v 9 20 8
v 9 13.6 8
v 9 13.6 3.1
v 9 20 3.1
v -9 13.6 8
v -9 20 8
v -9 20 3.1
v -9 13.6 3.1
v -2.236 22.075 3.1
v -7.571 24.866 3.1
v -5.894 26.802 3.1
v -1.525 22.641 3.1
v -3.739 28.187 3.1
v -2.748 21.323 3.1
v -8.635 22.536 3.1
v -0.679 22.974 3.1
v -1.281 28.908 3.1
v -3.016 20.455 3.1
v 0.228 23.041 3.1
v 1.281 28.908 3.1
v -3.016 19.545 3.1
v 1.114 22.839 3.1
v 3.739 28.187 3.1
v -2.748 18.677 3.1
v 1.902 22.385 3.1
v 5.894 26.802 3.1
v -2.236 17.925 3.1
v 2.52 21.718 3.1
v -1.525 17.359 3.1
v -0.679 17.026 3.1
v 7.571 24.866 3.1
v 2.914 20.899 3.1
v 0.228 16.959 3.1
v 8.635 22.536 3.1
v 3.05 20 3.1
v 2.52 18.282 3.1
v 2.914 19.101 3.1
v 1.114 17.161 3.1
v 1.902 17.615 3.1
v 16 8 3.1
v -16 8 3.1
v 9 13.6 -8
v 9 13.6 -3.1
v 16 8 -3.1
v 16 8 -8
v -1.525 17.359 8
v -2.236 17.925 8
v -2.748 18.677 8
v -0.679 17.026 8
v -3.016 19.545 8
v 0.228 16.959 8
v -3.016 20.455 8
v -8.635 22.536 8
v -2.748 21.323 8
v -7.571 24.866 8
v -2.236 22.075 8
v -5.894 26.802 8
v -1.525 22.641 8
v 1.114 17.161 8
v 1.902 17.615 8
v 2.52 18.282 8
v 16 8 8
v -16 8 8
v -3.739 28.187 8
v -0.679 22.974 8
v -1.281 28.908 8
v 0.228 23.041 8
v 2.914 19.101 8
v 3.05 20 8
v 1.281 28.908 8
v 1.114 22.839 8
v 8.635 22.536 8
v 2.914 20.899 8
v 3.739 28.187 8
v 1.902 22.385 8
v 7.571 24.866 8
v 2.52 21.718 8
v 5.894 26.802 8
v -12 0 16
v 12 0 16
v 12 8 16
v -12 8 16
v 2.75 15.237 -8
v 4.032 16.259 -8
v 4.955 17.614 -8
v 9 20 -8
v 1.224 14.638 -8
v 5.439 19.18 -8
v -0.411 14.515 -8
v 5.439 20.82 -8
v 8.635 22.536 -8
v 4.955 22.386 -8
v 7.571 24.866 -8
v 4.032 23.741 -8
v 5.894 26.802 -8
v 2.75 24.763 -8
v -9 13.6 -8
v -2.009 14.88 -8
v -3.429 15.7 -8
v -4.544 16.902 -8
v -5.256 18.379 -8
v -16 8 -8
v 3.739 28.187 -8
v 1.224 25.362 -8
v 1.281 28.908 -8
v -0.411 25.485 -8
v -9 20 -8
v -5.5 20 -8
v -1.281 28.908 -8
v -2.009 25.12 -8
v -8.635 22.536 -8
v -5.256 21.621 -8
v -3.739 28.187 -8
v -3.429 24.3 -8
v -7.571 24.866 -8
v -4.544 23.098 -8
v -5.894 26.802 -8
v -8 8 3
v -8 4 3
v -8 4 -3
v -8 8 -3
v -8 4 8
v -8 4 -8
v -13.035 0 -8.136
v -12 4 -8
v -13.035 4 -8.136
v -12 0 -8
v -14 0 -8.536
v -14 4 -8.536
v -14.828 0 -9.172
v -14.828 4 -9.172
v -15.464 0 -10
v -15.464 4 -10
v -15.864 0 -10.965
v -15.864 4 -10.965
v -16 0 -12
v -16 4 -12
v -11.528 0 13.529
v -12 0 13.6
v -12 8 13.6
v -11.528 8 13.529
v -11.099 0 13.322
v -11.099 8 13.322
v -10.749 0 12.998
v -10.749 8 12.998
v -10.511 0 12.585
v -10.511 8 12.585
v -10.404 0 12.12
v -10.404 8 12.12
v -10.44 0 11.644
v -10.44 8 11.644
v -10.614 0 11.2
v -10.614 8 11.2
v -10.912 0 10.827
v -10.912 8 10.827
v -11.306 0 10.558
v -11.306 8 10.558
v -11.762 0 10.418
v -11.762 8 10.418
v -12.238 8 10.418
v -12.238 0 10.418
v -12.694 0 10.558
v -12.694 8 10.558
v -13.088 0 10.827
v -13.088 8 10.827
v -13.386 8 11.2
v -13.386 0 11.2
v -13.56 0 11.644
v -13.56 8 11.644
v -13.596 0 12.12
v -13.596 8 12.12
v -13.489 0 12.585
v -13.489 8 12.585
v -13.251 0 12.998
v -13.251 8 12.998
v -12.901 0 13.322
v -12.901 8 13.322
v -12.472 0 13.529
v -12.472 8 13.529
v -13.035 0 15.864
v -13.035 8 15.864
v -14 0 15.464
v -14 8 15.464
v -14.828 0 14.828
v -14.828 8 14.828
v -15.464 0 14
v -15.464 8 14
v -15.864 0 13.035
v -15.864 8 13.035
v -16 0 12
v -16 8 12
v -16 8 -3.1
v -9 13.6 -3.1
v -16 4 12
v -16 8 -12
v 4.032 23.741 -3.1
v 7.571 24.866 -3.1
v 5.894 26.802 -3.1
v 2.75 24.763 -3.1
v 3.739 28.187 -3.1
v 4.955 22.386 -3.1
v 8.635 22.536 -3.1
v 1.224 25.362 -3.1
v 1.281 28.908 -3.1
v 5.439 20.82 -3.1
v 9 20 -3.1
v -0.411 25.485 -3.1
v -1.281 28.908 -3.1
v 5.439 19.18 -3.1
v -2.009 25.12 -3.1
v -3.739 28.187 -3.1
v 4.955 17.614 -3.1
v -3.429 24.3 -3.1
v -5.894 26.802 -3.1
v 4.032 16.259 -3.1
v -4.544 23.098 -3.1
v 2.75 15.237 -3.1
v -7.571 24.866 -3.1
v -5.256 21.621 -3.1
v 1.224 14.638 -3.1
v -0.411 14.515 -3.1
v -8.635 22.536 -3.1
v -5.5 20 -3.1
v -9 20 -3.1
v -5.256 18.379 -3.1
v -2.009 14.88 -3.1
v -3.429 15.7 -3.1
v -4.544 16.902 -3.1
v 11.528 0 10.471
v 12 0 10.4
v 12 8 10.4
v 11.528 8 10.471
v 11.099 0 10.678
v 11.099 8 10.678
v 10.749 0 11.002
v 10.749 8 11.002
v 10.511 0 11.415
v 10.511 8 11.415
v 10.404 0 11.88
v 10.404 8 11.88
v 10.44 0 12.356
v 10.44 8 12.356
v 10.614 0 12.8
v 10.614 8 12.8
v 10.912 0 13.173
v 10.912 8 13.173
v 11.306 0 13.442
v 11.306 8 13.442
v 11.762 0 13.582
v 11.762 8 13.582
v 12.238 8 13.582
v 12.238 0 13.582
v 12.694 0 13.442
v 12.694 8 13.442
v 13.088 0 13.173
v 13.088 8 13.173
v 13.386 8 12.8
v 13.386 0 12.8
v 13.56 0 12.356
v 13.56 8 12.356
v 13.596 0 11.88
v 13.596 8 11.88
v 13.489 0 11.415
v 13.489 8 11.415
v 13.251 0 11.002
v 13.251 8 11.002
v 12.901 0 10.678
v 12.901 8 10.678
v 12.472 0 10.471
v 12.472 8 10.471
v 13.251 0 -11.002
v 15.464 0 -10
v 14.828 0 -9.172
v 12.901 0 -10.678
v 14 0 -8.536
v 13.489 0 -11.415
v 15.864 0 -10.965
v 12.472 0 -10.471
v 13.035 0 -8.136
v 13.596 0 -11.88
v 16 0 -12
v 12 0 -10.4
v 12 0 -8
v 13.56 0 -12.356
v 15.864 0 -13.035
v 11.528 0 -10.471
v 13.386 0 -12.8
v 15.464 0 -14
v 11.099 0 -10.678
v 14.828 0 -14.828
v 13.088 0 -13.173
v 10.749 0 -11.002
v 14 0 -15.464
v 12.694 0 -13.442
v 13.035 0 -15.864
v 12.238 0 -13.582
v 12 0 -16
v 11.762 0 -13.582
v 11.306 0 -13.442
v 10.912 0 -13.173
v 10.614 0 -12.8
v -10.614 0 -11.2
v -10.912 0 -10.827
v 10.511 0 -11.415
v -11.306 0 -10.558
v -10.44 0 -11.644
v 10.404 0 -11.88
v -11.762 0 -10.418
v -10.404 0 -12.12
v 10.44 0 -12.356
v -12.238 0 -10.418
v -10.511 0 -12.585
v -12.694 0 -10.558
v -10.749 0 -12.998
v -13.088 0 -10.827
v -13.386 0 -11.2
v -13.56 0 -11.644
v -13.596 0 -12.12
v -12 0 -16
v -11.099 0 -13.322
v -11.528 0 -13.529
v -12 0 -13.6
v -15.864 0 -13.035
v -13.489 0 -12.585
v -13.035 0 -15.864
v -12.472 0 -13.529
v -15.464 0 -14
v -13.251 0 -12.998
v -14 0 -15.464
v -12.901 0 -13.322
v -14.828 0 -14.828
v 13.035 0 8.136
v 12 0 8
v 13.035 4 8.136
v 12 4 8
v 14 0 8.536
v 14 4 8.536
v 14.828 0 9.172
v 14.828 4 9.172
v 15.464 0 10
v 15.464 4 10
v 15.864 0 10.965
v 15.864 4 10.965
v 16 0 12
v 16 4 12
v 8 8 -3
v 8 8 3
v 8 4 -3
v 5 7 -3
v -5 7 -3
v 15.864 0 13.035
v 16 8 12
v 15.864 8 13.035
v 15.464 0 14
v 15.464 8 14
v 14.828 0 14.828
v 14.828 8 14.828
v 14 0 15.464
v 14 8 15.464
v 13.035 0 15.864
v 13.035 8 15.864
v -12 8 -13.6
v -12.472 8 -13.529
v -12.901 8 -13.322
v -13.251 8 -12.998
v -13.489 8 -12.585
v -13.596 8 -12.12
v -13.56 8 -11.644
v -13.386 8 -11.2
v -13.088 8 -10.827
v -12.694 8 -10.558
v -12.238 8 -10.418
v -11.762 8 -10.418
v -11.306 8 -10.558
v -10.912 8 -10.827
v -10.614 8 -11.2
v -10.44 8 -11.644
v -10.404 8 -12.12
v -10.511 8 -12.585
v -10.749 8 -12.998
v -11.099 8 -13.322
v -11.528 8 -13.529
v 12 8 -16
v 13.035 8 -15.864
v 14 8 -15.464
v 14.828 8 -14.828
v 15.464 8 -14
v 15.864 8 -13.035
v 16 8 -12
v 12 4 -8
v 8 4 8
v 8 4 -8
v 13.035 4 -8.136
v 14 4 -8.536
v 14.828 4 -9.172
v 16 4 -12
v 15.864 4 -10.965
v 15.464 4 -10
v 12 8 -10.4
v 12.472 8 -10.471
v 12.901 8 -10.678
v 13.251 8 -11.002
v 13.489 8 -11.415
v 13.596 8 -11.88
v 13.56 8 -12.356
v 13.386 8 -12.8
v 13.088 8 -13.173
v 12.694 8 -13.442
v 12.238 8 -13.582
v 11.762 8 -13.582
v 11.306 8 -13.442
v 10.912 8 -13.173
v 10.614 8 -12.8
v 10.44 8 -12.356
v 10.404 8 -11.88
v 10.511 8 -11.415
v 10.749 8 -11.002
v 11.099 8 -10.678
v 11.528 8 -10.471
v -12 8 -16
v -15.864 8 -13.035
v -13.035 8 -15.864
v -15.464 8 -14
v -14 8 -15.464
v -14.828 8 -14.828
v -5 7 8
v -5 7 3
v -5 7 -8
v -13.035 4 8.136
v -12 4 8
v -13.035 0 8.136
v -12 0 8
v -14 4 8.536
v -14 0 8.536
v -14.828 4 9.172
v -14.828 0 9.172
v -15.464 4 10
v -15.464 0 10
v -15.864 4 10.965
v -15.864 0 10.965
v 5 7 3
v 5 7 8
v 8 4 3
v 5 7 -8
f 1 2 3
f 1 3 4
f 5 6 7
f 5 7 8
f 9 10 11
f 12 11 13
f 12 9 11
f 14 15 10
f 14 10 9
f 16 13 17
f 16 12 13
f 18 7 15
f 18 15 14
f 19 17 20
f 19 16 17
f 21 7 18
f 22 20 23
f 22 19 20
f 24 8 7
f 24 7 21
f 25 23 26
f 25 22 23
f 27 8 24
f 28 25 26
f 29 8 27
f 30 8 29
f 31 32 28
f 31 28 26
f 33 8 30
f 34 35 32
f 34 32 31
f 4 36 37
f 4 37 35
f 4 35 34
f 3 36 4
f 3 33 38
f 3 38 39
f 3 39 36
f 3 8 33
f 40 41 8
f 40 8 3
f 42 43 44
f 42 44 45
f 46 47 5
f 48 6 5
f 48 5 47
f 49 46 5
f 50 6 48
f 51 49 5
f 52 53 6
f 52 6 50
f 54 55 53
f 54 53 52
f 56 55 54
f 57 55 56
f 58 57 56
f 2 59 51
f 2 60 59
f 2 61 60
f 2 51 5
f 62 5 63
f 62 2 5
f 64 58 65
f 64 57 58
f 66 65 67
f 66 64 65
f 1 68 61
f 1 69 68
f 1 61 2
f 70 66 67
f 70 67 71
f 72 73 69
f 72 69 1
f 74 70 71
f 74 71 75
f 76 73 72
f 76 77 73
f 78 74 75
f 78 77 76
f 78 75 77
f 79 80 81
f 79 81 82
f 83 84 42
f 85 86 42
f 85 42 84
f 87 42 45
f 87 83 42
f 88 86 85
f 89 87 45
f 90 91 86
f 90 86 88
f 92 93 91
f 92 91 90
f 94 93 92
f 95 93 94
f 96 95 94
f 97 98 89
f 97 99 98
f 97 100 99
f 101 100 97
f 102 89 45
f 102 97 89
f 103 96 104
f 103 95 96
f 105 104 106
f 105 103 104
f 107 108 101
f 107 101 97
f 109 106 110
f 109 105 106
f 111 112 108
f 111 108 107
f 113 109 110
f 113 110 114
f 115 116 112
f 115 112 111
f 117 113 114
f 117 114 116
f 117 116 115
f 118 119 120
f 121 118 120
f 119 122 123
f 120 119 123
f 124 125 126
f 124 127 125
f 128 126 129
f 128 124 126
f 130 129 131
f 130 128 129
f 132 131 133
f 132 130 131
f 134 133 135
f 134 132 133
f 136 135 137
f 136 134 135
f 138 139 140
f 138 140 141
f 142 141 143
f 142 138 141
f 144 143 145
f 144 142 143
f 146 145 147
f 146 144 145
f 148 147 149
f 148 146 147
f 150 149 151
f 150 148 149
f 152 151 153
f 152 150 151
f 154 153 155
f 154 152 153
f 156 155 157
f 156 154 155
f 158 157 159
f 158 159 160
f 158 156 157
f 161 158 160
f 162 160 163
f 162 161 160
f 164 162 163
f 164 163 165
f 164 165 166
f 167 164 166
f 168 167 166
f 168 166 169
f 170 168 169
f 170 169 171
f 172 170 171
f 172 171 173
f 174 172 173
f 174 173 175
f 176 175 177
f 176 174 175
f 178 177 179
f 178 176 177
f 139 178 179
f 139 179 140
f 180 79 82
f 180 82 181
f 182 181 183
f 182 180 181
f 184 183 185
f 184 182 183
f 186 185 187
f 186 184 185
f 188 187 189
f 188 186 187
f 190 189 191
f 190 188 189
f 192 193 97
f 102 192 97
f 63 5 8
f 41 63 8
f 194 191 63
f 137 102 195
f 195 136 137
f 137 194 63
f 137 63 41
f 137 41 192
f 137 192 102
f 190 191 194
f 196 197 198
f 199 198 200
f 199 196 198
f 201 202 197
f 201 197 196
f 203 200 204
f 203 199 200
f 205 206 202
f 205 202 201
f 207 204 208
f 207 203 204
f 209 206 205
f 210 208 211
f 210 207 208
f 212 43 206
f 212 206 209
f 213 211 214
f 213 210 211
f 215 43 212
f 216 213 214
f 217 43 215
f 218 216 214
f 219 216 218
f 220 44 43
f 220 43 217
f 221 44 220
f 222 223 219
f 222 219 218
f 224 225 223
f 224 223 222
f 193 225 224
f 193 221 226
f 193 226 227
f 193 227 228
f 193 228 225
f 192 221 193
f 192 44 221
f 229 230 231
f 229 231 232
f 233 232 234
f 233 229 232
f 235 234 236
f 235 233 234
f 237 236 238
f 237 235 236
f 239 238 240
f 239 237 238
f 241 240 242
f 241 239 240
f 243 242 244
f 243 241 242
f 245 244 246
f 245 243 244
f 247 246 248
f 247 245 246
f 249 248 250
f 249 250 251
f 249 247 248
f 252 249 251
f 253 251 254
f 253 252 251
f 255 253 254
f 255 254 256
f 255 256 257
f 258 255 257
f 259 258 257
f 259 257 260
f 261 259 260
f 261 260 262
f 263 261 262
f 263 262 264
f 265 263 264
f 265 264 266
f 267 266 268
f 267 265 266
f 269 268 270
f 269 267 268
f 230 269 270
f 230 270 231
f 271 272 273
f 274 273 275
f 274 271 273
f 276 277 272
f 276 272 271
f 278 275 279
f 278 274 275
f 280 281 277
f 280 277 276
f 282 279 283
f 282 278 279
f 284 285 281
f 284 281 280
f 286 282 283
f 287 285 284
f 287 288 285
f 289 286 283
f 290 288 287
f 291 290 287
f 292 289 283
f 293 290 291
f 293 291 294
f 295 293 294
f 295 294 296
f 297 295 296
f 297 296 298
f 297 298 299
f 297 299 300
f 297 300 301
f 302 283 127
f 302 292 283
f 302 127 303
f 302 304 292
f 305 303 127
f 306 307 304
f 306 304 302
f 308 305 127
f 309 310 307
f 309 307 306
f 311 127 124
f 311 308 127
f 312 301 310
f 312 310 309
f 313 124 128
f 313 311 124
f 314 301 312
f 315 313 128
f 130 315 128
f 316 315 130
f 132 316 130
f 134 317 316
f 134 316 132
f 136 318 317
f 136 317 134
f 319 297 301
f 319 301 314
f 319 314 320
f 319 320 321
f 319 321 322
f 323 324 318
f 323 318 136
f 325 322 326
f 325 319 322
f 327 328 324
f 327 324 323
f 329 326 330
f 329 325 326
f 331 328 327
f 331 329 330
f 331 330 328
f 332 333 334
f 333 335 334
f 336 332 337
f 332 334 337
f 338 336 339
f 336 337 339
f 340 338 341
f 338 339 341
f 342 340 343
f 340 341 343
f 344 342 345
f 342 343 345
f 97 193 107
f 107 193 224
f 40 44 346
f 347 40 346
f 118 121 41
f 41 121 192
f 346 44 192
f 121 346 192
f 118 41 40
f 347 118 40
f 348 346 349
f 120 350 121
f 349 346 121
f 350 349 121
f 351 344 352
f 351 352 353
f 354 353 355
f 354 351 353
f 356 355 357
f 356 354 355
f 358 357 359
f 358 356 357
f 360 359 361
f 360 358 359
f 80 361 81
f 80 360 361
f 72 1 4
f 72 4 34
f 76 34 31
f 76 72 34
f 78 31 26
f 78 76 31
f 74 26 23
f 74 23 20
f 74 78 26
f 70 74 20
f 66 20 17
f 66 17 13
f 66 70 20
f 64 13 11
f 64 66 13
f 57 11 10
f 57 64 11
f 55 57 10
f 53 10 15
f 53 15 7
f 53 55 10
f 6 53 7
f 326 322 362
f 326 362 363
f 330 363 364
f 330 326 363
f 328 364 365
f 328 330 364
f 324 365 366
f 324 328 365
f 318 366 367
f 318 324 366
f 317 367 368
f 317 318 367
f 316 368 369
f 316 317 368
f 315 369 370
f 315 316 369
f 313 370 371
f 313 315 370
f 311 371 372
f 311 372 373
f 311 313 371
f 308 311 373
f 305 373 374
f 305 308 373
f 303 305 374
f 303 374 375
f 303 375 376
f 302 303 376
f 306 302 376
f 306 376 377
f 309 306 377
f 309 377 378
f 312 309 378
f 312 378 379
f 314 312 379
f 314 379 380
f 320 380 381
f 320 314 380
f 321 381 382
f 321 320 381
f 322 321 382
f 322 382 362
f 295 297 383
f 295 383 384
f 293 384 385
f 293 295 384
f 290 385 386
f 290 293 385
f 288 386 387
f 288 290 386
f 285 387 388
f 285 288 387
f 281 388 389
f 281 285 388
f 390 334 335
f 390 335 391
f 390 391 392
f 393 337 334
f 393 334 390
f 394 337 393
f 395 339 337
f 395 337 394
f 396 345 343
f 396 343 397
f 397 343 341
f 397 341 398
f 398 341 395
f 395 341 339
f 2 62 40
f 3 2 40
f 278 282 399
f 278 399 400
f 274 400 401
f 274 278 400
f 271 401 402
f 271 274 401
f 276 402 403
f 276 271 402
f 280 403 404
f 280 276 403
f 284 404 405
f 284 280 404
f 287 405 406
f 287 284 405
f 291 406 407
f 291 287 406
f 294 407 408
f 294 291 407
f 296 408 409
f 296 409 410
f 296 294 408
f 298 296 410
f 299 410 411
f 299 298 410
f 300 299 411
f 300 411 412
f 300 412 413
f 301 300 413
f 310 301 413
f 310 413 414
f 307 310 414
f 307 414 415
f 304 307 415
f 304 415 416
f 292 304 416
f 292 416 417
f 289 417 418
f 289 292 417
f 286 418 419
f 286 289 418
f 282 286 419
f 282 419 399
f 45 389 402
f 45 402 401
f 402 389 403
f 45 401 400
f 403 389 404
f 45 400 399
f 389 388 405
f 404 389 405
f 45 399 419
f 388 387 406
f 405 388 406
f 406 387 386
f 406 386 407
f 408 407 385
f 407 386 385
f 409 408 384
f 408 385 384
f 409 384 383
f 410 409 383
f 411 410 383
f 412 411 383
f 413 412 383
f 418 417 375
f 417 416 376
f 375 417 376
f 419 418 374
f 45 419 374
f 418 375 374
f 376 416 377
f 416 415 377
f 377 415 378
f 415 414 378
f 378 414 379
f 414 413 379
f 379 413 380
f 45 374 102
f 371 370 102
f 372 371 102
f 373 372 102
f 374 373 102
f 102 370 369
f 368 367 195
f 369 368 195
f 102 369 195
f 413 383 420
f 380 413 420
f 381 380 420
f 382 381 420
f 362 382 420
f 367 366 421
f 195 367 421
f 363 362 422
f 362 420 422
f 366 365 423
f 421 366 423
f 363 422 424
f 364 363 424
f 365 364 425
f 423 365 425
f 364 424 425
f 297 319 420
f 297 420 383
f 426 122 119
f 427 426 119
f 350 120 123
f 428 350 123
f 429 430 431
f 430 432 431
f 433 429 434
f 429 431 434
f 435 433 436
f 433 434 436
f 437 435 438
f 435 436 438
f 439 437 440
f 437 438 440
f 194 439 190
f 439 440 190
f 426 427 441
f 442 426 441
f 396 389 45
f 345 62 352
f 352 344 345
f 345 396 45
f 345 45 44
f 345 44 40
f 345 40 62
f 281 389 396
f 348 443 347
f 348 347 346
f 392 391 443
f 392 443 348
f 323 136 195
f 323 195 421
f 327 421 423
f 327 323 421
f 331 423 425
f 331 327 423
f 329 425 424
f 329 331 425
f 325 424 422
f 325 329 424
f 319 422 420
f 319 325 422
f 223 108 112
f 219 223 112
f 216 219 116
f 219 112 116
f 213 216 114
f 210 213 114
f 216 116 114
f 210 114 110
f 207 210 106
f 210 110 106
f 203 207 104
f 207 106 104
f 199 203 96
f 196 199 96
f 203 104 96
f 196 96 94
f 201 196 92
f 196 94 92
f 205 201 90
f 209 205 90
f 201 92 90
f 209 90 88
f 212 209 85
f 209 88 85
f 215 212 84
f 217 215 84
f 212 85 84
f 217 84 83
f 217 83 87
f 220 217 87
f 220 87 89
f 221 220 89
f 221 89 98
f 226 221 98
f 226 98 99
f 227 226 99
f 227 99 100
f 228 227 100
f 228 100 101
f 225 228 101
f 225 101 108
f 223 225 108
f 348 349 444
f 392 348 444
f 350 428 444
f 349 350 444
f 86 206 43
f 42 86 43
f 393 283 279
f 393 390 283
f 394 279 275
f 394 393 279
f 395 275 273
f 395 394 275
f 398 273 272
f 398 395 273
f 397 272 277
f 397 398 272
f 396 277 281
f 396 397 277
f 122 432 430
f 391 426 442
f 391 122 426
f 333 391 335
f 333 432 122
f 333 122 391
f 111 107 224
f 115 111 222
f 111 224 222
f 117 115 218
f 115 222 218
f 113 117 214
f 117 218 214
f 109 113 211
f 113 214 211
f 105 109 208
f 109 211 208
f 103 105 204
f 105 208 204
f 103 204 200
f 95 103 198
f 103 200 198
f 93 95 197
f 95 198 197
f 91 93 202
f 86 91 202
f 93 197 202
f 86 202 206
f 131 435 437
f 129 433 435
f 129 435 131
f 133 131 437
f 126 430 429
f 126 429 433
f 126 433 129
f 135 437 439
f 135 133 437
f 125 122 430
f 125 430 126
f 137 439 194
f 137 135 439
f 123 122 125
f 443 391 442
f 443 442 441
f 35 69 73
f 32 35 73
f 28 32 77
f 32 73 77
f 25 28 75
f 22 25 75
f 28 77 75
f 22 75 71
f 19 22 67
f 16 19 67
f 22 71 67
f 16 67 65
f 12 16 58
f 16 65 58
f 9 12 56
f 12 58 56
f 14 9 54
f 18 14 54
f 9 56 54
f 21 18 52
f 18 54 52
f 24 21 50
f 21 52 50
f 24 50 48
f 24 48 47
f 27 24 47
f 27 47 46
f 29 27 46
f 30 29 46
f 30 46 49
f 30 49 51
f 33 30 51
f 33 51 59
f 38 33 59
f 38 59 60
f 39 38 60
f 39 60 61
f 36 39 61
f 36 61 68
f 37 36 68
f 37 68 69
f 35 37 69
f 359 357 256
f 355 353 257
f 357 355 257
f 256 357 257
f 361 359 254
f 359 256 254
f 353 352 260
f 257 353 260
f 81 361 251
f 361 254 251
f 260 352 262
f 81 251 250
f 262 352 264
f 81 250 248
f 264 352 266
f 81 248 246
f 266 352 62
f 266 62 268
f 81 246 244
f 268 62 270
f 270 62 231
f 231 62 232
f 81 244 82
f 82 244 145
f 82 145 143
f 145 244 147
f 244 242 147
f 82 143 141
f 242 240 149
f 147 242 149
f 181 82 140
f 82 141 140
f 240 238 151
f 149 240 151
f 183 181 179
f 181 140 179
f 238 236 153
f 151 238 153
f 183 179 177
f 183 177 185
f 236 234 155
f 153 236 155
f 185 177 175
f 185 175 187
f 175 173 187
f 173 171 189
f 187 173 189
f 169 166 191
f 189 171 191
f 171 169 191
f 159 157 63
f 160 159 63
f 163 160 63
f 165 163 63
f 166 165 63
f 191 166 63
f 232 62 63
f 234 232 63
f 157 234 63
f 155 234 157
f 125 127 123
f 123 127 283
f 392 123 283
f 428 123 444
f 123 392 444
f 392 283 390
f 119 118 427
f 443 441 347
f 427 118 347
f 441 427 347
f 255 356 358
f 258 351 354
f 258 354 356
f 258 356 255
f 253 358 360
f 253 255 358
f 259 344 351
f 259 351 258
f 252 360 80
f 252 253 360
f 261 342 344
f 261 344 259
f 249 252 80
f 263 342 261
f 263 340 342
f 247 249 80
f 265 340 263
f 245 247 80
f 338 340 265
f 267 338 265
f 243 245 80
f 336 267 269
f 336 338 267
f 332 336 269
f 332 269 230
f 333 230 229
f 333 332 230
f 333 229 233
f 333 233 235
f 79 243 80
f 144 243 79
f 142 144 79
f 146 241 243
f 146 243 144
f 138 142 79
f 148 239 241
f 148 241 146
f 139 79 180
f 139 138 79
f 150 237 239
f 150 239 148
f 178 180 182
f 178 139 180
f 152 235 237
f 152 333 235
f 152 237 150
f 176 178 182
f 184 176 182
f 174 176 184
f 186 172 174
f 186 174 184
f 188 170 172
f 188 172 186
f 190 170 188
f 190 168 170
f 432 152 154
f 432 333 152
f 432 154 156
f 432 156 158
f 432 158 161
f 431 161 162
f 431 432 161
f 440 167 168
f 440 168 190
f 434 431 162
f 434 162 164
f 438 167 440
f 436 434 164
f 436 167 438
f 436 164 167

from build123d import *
from OCP.BRepFilletAPI import BRepFilletAPI_MakeChamfer

# Parameters (mm, degrees)
SKETCH1_R                = 1.6
SKETCH1_W                = 16
SKETCH1_H                = 16
BOSS_EXTRUDE1_DEPTH      = 8
SKETCH2_W                = 16
SKETCH2_H                = 4
CUT_EXTRUDE1_DEPTH       = 40
FILLET1_R                = 4
BOSS_EXTRUDE5_DEPTH      = 8
BOSS_EXTRUDE5_DEPTH_BACK = 1
SKETCH3_W                = 32
SKETCH3_H                = 5
CHAMFER1_SIZE            = 3
CHAMFER2_SIZE            = 8
CHAMFER2_SIZE2           = 10
SKETCH5_W                = 12
SKETCH5_H                = 5
BOSS_EXTRUDE7_DEPTH      = 8
FILLET2_R                = 4
SKETCH6_R                = 1.6
CUT_EXTRUDE2_DEPTH       = 20
SKETCH7_R                = 3.05
CUT_EXTRUDE3_DEPTH       = 9
SKETCH8_R                = 3.05
BOSS_EXTRUDE8_DEPTH      = 5
BOSS_EXTRUDE9_START      = -5
SKETCH9_R                = 1.6
BOSS_EXTRUDE9_DEPTH      = 5
SKETCH10_R               = 5.5
CUT_EXTRUDE4_DEPTH       = 9
CUT_EXTRUDE5_DEPTH       = 37


with BuildPart() as part:
    # Sketch1 → Boss-Extrude1 (new body)
    with BuildSketch(Plane(origin=(0, 0, 0), x_dir=(1, 0, 0), z_dir=(0, 1, 0))):
        with BuildLine():
            Line((-12, 16), (12, 16))
            ThreePointArc((12, 16), (14.828427125, 14.828427125), (16, 12))
            Line((16, 12), (16, -12))
            ThreePointArc((16, -12), (14.828427125, -14.828427125), (12, -16))
            Line((12, -16), (-12, -16))
            ThreePointArc((-12, -16), (-14.828427125, -14.828427125), (-16, -12))
            Line((-16, -12), (-16, 12))
            ThreePointArc((-16, 12), (-14.828427125, 14.828427125), (-12, 16))
        make_face()
        with Locations(Location((12, 12, 0), (0, 0, 270))):
            Circle(SKETCH1_R, mode=Mode.SUBTRACT)
        with Locations(Location((-12, 12, 0), (0, 0, 90))):
            Circle(SKETCH1_R, mode=Mode.SUBTRACT)
        with Locations(Location((12, -12, 0), (0, 0, 90))):
            Circle(SKETCH1_R, mode=Mode.SUBTRACT)
        with Locations(Location((-12, -12, 0), (0, 0, 270))):
            Circle(SKETCH1_R, mode=Mode.SUBTRACT)
        Rectangle(SKETCH1_W, SKETCH1_H, mode=Mode.SUBTRACT)
    extrude(amount=BOSS_EXTRUDE1_DEPTH)

    # Sketch2 → Cut-Extrude1 (cut)
    with BuildSketch(Plane(origin=(16, 0, 0), x_dir=(0, 0, -1), z_dir=(1, 0, 0))):
        with Locations((0, 2)):
            Rectangle(SKETCH2_W, SKETCH2_H)
    extrude(amount=-CUT_EXTRUDE1_DEPTH, mode=Mode.SUBTRACT)

    # Fillet1
    fillet1_edges = [part.edges().sort_by_distance(p)[0] for p in [
        (-16, 2, -8),
        (16, 2, -8),
        (-16, 2, 8),
        (16, 2, 8),
    ]]
    fillet(fillet1_edges, radius=FILLET1_R - 0.0001)  # a hair under: the kernel refuses the full size

    # Sketch3 → Boss-Extrude5 (add, two sides: drawn at the far end of the back side and taken through both)
    with BuildSketch(Plane(origin=(0, 8, 0), x_dir=(1, 0, 0), z_dir=(0, 1, 0)).offset(-BOSS_EXTRUDE5_DEPTH_BACK)):
        with Locations((0, 5.5)):
            Rectangle(SKETCH3_W, SKETCH3_H)
        with Locations((0, -5.5)):
            Rectangle(SKETCH3_W, SKETCH3_H)
    extrude(amount=BOSS_EXTRUDE5_DEPTH + BOSS_EXTRUDE5_DEPTH_BACK)

    # Chamfer1
    chamfer1_edges = [part.edges().sort_by_distance(p)[0] for p in [
        (8, 7, 5.5),
        (8, 7, -5.5),
        (-8, 7, -5.5),
        (-8, 7, 5.5),
    ]]
    chamfer(chamfer1_edges, length=CHAMFER1_SIZE - 0.0001)  # a hair under: the kernel refuses the full size

    # Chamfer2: one chamfer whose edges measure the first distance from different faces: ONE call of the kernel's chamfer builder (chamfer() names one face for all edges)
    chamfer2_edges_1 = [part.edges().sort_by_distance(p)[0] for p in [
        (16, 16, -5.5),
        (16, 16, 5.5),
    ]]
    chamfer2_side_1 = [part.faces().sort_by_distance(p)[0] for p in [
        (16, 0.288444102, -11.99995),
    ]]
    chamfer2_edges_2 = [part.edges().sort_by_distance(p)[0] for p in [
        (-16, 16, -5.5),
        (-16, 16, 5.5),
    ]]
    chamfer2_side_2 = [part.faces().sort_by_distance(p)[0] for p in [
        (-16, 0.288444102, 11.99995),
    ]]
    chamfer2 = BRepFilletAPI_MakeChamfer(part.part.solid().wrapped)
    for e in chamfer2_edges_1:
        chamfer2.Add(CHAMFER2_SIZE, CHAMFER2_SIZE2, e.wrapped, chamfer2_side_1[0].wrapped)  # the first distance lies on this face
    for e in chamfer2_edges_2:
        chamfer2.Add(CHAMFER2_SIZE, CHAMFER2_SIZE2, e.wrapped, chamfer2_side_2[0].wrapped)  # the first distance lies on this face
    add(Compound.cast(chamfer2.Shape()), mode=Mode.REPLACE)

    # Sketch5 → Boss-Extrude7 (add)
    with BuildSketch(Plane(origin=(0, 16, 0), x_dir=(1, 0, 0), z_dir=(0, 1, 0))):
        with Locations((0, 5.5)):
            Rectangle(SKETCH5_W, SKETCH5_H)
        with Locations((0, -5.5)):
            Rectangle(SKETCH5_W, SKETCH5_H)
    extrude(amount=BOSS_EXTRUDE7_DEPTH)

    # Fillet2
    fillet2_edges = [part.edges().sort_by_distance(p)[0] for p in [
        (-6, 24, -5.5),
        (6, 24, -5.5),
        (-6, 24, 5.5),
        (6, 24, 5.5),
    ]]
    fillet(fillet2_edges, radius=FILLET2_R)

    # Sketch6 → Cut-Extrude2 (cut)
    with BuildSketch(Plane.XY.offset(8)):
        with Locations((0, 20)):
            Circle(SKETCH6_R)
    extrude(amount=-CUT_EXTRUDE2_DEPTH, mode=Mode.SUBTRACT)

    # Sketch7 → Cut-Extrude3 (cut)
    with BuildSketch(Plane.XY.offset(8)):
        with Locations((0, 20)):
            Circle(SKETCH7_R)
    extrude(amount=-CUT_EXTRUDE3_DEPTH, mode=Mode.SUBTRACT)

    # Sketch8 → Boss-Extrude8 (add)
    with BuildSketch(Plane.XY.offset(8)):
        with BuildLine():
            Line((-9, 20), (-9, 11))
            Line((-9, 11), (0, 11))
            Line((0, 11), (9, 11))
            Line((9, 11), (9, 20))
            ThreePointArc((9, 20), (0, 29), (-9, 20))
        make_face()
        with Locations((0, 20)):
            Circle(SKETCH8_R, mode=Mode.SUBTRACT)
    extrude(amount=-BOSS_EXTRUDE8_DEPTH)

    # Sketch9 → Boss-Extrude9 (add)
    with BuildSketch(Plane(origin=(0, 0, -8), x_dir=(-1, 0, 0), z_dir=(0, 0, -1)).offset(BOSS_EXTRUDE9_START)):
        with BuildLine():
            Line((-9, 20), (-9, 11))
            Line((-9, 11), (9, 11))
            Line((9, 11), (9, 20))
            ThreePointArc((9, 20), (0, 29), (-9, 20))
        make_face()
        with Locations(Location((0, 20, 0), (0, 0, 180))):
            Circle(SKETCH9_R, mode=Mode.SUBTRACT)
    extrude(amount=BOSS_EXTRUDE9_DEPTH)

    # Sketch10 → Cut-Extrude4 (cut)
    with BuildSketch(Plane(origin=(0, 0, -8), x_dir=(-1, 0, 0), z_dir=(0, 0, -1))):
        with Locations((0, 20)):
            Circle(SKETCH10_R)
    extrude(amount=-CUT_EXTRUDE4_DEPTH, mode=Mode.SUBTRACT)

    # Sketch11 → Cut-Extrude5 (cut)
    with BuildSketch(Plane(origin=(0, 8, 0), x_dir=(1, 0, 0), z_dir=(0, 1, 0))):
        Polygon((0, 3.1), (23.961552098, 3.1), (23.961552098, -3.1), (0, -3.1), (-29.391122595, -3.1), (-29.391122595, 3.1), align=None)
    extrude(amount=CUT_EXTRUDE5_DEPTH, mode=Mode.SUBTRACT)


solid = part.part
